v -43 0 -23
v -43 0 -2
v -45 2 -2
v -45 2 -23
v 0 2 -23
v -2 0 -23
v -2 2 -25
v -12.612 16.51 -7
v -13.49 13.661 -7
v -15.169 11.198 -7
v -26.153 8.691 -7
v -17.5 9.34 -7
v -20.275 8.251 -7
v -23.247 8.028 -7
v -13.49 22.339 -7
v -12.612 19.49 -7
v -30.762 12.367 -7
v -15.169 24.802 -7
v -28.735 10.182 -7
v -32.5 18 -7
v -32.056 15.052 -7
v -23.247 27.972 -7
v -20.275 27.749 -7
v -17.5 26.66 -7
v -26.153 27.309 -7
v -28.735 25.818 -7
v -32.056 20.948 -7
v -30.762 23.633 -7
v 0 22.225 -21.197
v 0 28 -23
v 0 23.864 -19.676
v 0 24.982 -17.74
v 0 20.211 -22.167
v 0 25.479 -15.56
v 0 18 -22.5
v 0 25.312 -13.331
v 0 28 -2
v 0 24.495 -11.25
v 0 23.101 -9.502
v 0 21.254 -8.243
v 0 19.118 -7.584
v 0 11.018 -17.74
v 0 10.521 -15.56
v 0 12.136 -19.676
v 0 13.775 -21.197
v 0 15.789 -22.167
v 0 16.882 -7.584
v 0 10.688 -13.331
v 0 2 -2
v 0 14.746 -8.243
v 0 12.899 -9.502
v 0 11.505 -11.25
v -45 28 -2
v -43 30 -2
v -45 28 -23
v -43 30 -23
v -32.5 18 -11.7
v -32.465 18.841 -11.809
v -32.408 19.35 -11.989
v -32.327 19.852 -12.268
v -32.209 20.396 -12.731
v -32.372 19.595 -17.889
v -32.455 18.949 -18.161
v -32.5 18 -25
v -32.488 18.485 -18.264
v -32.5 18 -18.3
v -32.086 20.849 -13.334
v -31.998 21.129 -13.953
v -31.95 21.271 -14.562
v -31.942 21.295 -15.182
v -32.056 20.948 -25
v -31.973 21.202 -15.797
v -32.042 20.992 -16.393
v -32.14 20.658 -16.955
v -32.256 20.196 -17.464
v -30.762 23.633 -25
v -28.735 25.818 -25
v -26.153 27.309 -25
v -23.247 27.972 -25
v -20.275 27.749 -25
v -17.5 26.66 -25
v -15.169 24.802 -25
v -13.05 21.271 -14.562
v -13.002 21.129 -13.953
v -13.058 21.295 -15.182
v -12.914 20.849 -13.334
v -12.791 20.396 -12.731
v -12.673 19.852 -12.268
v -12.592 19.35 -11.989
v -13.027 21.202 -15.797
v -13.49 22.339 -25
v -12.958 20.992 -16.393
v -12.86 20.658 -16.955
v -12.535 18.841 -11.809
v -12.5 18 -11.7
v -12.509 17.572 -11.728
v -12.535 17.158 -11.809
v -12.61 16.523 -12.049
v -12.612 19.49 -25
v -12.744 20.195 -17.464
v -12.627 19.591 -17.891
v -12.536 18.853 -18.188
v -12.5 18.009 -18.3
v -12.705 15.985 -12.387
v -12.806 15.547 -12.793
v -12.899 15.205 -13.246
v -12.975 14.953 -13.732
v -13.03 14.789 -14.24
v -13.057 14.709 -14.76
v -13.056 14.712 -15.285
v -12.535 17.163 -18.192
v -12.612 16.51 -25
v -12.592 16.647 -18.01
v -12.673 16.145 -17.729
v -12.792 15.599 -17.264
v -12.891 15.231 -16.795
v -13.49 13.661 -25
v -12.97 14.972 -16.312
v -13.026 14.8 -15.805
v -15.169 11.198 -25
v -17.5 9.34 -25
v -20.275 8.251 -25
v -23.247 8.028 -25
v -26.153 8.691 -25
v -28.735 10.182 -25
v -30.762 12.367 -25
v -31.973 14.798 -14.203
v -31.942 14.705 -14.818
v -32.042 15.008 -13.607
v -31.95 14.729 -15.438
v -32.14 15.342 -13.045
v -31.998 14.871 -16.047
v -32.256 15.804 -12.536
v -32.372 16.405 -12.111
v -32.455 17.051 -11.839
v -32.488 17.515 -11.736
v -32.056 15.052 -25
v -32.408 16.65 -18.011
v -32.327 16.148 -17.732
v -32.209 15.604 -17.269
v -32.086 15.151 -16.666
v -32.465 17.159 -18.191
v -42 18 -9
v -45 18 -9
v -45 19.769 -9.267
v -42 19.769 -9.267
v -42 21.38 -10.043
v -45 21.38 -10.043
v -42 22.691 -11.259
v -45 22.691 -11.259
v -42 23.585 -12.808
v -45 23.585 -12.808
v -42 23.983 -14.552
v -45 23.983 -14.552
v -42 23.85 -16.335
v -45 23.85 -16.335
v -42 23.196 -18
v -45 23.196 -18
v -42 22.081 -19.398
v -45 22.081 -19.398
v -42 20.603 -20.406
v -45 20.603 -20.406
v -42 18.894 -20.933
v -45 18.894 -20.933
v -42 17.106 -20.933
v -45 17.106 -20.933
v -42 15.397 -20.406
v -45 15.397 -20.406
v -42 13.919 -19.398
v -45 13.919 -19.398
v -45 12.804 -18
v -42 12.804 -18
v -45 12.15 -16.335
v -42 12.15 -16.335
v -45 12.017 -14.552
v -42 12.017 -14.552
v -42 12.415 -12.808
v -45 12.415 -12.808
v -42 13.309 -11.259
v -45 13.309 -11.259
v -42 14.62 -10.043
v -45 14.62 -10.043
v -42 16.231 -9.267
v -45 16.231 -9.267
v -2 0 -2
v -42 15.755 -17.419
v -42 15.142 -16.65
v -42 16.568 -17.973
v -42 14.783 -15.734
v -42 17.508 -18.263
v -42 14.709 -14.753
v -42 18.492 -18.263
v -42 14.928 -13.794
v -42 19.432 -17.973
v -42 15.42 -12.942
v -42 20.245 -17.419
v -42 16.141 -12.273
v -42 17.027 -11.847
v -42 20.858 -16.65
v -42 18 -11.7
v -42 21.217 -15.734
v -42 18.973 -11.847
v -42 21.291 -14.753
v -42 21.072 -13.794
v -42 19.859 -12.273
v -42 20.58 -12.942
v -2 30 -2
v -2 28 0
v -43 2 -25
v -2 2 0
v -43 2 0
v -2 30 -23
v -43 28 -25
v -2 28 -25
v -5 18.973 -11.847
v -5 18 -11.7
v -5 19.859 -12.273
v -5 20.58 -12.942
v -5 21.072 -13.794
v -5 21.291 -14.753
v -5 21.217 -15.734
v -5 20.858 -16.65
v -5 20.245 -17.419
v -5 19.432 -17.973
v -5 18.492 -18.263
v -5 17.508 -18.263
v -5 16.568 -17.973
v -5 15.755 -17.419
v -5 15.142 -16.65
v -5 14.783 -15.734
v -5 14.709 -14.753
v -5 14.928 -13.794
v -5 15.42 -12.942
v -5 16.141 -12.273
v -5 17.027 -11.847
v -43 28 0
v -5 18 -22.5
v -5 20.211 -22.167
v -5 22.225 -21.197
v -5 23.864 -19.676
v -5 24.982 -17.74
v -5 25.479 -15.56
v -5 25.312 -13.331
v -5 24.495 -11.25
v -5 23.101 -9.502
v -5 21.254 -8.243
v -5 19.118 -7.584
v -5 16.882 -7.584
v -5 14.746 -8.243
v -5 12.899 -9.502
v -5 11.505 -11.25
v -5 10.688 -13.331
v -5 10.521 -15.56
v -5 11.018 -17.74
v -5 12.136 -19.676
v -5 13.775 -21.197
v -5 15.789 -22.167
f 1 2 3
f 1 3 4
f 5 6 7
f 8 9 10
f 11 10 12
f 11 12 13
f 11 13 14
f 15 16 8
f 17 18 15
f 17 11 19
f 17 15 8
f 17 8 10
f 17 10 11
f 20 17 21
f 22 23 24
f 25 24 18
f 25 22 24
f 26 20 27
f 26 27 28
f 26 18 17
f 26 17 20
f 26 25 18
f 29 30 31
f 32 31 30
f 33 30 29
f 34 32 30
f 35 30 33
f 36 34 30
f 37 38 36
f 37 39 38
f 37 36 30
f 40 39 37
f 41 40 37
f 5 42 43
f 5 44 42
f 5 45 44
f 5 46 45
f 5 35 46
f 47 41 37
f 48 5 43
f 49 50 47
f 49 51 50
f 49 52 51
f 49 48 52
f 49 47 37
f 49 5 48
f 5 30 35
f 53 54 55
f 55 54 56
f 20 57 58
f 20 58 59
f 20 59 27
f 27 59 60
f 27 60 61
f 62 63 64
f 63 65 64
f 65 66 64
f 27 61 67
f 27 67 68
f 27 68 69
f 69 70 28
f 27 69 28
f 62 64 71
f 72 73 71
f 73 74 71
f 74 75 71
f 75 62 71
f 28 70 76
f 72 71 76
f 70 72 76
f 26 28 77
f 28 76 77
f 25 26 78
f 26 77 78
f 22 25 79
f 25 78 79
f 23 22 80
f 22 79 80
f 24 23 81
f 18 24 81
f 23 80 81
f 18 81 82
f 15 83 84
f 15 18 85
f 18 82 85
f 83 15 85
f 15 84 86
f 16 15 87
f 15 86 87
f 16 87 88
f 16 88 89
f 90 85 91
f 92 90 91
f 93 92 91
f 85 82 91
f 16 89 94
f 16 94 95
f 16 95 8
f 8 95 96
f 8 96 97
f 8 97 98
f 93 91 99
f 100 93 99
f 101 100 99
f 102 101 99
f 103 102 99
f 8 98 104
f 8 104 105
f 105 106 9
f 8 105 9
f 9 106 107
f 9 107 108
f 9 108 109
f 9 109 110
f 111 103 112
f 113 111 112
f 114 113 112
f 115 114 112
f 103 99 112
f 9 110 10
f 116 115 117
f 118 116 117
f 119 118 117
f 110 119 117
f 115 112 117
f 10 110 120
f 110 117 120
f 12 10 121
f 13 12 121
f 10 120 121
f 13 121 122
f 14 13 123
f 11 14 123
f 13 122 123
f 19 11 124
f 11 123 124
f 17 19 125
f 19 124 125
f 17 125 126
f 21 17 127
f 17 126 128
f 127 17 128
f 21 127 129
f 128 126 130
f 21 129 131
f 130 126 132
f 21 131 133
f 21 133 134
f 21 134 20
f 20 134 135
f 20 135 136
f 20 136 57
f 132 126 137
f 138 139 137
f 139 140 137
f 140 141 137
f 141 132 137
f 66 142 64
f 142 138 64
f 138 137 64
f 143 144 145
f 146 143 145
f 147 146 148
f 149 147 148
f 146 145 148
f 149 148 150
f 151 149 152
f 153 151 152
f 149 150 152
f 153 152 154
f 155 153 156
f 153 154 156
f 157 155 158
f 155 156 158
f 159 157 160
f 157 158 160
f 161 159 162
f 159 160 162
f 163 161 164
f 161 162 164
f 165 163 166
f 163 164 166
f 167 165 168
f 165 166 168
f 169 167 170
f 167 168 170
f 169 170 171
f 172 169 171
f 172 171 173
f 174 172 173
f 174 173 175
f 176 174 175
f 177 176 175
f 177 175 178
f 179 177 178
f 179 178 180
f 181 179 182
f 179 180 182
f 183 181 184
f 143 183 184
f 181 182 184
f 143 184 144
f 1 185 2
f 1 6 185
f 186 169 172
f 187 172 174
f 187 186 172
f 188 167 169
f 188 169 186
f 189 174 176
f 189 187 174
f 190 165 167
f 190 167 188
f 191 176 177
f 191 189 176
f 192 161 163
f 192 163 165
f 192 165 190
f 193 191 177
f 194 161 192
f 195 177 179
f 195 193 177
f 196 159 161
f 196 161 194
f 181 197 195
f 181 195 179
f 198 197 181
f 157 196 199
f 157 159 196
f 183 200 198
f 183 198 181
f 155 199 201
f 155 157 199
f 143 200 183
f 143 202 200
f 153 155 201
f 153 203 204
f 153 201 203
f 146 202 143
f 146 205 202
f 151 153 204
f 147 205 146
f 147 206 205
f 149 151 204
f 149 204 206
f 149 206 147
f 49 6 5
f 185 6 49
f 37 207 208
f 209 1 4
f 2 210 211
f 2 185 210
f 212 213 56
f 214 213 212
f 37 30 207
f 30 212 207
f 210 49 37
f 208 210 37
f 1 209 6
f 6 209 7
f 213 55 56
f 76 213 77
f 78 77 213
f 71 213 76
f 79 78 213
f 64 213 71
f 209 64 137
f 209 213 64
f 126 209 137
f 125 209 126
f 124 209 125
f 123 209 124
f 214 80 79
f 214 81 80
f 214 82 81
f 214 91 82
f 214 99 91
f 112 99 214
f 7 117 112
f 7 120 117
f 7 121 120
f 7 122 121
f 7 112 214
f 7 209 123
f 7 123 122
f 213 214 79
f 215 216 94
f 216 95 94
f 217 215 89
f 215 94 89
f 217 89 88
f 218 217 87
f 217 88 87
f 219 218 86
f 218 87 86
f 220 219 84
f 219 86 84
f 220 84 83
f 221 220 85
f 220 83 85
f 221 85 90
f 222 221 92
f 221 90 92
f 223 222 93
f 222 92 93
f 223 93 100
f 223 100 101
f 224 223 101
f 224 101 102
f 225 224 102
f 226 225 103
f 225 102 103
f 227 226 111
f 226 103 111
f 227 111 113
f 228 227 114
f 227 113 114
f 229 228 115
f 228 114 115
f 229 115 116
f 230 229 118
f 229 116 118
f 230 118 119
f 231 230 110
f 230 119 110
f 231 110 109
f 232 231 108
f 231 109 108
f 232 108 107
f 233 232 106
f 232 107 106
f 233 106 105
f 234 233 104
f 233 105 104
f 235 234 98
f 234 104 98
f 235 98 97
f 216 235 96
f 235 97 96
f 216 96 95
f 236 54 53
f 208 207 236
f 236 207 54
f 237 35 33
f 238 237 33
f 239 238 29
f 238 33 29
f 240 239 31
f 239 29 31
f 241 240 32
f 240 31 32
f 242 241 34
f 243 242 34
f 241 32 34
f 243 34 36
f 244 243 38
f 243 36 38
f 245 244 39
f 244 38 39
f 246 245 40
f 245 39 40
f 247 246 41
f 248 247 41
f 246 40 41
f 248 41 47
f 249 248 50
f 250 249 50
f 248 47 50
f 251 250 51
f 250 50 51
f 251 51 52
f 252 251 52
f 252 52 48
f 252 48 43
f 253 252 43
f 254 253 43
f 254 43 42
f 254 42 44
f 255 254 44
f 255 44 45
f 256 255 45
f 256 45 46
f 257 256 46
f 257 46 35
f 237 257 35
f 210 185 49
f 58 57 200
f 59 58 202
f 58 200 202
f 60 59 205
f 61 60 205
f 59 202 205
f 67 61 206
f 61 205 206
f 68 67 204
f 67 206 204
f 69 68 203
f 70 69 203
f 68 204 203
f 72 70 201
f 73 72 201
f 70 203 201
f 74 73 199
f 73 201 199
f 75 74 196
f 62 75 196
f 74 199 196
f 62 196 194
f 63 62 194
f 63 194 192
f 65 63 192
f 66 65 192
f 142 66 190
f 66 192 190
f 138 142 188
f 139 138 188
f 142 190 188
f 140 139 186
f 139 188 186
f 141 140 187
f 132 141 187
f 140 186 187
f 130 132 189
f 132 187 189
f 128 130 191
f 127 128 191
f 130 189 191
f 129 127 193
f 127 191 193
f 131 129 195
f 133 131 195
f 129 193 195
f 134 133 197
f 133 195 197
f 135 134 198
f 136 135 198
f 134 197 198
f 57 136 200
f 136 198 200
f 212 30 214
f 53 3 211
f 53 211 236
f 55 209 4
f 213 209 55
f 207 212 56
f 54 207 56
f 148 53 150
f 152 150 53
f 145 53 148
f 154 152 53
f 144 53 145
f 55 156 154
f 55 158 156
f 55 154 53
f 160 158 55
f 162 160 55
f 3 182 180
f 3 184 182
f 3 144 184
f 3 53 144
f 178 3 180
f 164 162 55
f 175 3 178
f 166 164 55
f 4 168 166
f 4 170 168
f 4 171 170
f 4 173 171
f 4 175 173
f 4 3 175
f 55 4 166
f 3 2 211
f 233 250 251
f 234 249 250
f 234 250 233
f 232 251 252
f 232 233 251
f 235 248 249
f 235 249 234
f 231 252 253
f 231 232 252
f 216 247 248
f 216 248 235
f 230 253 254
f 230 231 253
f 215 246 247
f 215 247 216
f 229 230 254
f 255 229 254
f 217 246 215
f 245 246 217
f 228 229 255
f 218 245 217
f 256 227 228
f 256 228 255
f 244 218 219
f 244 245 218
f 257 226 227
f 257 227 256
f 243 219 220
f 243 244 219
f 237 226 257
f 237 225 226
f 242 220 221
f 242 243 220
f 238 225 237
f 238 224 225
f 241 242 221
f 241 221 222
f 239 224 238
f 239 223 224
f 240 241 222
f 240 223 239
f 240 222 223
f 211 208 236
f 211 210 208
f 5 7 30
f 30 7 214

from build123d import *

# Parameters (mm, degrees)
ESTRUSIONE_ESTRUSIONE1_DEPTH                         = 30
SCHIZZO2_R                                           = 9.999999999999993
TAGLIO_ESTRUSIONE1_DEPTH                             = 18
FORO_LAMATO_PER_VITE_M6_A_TESTA_CILINDRI_D           = 6.6
FORO_LAMATO_PER_VITE_M6_A_TESTA_CILINDRI_DEPTH       = 80
FORO_LAMATO_PER_VITE_M6_A_TESTA_CILINDRI_CBORE_D     = 15
FORO_LAMATO_PER_VITE_M6_A_TESTA_CILINDRI_CBORE_DEPTH = 5
FORO_LAMATO_PER_VITE_M6_A_TESTA_CILINDRI_TIP         = 1.982840042790949
SMUSSO1_SIZE                                         = 2
SCHIZZO6_R                                           = 6.000000000000001
TAGLIO_ESTRUSIONE2_DEPTH                             = 3


with BuildPart() as part:
    # Schizzo1 → Estrusione-Estrusione1 (new body)
    with BuildSketch(Plane(origin=(0, 0, 0), x_dir=(1, 0, 0), z_dir=(0, 1, 0))):
        Polygon((0, 0), (-45, -6.12e-15), (-45, 24.999999999999993), (0, 25.000000000000004), align=None)
    extrude(amount=ESTRUSIONE_ESTRUSIONE1_DEPTH)

    # Schizzo2 → Taglio-Estrusione1 (cut)
    with BuildSketch(Plane(origin=(-5.78e-15, 0, -25.000000000000004), x_dir=(-1, 0, 2.1e-16), z_dir=(-2.1e-16, 0, -1))):
        with Locations((22.499999999999993, 18)):
            Circle(SCHIZZO2_R)
    extrude(amount=-TAGLIO_ESTRUSIONE1_DEPTH, mode=Mode.SUBTRACT)

    # Foro lamato per Vite M6 a testa cilindrica-1
    with Locations(Plane(origin=(0, 0, 0), x_dir=(0, 0, -1), z_dir=(1, 0, 0))):
        with Locations((15, 18)):
            CounterBoreHole(FORO_LAMATO_PER_VITE_M6_A_TESTA_CILINDRI_D / 2, FORO_LAMATO_PER_VITE_M6_A_TESTA_CILINDRI_CBORE_D / 2, FORO_LAMATO_PER_VITE_M6_A_TESTA_CILINDRI_CBORE_DEPTH, depth=FORO_LAMATO_PER_VITE_M6_A_TESTA_CILINDRI_DEPTH)
            with Locations((0, 0, -(FORO_LAMATO_PER_VITE_M6_A_TESTA_CILINDRI_DEPTH + FORO_LAMATO_PER_VITE_M6_A_TESTA_CILINDRI_TIP / 2))):  # 118° drill point
                Cone(0, FORO_LAMATO_PER_VITE_M6_A_TESTA_CILINDRI_D / 2, FORO_LAMATO_PER_VITE_M6_A_TESTA_CILINDRI_TIP, mode=Mode.SUBTRACT)

    # Smusso1
    smusso1_edges = [part.edges().sort_by_distance(p)[0] for p in [
        (-45, 30, -12.499999999999995),
        (-22.5, 30, 3.06e-15),
        (0, 30, -12.500000000000002),
        (-22.5, 0, 3.06e-15),
        (-45, 0, -12.499999999999995),
        (-22.5, 0, -25),
        (0, 0, -12.500000000000002),
        (0, 15, 0),
        (-45, 15, 6.12e-15),
        (-45, 15, -24.999999999999993),
        (0, 15, -25.000000000000004),
        (-22.5, 30, -25),
    ]]
    chamfer(smusso1_edges, length=SMUSSO1_SIZE)

    # Schizzo6 → Taglio-Estrusione2 (cut)
    with BuildSketch(Plane.ZY.offset(45)):
        with Locations((-15.000000000000005, 18)):
            Circle(SCHIZZO6_R)
    extrude(amount=-TAGLIO_ESTRUSIONE2_DEPTH, mode=Mode.SUBTRACT)


solid = part.part
